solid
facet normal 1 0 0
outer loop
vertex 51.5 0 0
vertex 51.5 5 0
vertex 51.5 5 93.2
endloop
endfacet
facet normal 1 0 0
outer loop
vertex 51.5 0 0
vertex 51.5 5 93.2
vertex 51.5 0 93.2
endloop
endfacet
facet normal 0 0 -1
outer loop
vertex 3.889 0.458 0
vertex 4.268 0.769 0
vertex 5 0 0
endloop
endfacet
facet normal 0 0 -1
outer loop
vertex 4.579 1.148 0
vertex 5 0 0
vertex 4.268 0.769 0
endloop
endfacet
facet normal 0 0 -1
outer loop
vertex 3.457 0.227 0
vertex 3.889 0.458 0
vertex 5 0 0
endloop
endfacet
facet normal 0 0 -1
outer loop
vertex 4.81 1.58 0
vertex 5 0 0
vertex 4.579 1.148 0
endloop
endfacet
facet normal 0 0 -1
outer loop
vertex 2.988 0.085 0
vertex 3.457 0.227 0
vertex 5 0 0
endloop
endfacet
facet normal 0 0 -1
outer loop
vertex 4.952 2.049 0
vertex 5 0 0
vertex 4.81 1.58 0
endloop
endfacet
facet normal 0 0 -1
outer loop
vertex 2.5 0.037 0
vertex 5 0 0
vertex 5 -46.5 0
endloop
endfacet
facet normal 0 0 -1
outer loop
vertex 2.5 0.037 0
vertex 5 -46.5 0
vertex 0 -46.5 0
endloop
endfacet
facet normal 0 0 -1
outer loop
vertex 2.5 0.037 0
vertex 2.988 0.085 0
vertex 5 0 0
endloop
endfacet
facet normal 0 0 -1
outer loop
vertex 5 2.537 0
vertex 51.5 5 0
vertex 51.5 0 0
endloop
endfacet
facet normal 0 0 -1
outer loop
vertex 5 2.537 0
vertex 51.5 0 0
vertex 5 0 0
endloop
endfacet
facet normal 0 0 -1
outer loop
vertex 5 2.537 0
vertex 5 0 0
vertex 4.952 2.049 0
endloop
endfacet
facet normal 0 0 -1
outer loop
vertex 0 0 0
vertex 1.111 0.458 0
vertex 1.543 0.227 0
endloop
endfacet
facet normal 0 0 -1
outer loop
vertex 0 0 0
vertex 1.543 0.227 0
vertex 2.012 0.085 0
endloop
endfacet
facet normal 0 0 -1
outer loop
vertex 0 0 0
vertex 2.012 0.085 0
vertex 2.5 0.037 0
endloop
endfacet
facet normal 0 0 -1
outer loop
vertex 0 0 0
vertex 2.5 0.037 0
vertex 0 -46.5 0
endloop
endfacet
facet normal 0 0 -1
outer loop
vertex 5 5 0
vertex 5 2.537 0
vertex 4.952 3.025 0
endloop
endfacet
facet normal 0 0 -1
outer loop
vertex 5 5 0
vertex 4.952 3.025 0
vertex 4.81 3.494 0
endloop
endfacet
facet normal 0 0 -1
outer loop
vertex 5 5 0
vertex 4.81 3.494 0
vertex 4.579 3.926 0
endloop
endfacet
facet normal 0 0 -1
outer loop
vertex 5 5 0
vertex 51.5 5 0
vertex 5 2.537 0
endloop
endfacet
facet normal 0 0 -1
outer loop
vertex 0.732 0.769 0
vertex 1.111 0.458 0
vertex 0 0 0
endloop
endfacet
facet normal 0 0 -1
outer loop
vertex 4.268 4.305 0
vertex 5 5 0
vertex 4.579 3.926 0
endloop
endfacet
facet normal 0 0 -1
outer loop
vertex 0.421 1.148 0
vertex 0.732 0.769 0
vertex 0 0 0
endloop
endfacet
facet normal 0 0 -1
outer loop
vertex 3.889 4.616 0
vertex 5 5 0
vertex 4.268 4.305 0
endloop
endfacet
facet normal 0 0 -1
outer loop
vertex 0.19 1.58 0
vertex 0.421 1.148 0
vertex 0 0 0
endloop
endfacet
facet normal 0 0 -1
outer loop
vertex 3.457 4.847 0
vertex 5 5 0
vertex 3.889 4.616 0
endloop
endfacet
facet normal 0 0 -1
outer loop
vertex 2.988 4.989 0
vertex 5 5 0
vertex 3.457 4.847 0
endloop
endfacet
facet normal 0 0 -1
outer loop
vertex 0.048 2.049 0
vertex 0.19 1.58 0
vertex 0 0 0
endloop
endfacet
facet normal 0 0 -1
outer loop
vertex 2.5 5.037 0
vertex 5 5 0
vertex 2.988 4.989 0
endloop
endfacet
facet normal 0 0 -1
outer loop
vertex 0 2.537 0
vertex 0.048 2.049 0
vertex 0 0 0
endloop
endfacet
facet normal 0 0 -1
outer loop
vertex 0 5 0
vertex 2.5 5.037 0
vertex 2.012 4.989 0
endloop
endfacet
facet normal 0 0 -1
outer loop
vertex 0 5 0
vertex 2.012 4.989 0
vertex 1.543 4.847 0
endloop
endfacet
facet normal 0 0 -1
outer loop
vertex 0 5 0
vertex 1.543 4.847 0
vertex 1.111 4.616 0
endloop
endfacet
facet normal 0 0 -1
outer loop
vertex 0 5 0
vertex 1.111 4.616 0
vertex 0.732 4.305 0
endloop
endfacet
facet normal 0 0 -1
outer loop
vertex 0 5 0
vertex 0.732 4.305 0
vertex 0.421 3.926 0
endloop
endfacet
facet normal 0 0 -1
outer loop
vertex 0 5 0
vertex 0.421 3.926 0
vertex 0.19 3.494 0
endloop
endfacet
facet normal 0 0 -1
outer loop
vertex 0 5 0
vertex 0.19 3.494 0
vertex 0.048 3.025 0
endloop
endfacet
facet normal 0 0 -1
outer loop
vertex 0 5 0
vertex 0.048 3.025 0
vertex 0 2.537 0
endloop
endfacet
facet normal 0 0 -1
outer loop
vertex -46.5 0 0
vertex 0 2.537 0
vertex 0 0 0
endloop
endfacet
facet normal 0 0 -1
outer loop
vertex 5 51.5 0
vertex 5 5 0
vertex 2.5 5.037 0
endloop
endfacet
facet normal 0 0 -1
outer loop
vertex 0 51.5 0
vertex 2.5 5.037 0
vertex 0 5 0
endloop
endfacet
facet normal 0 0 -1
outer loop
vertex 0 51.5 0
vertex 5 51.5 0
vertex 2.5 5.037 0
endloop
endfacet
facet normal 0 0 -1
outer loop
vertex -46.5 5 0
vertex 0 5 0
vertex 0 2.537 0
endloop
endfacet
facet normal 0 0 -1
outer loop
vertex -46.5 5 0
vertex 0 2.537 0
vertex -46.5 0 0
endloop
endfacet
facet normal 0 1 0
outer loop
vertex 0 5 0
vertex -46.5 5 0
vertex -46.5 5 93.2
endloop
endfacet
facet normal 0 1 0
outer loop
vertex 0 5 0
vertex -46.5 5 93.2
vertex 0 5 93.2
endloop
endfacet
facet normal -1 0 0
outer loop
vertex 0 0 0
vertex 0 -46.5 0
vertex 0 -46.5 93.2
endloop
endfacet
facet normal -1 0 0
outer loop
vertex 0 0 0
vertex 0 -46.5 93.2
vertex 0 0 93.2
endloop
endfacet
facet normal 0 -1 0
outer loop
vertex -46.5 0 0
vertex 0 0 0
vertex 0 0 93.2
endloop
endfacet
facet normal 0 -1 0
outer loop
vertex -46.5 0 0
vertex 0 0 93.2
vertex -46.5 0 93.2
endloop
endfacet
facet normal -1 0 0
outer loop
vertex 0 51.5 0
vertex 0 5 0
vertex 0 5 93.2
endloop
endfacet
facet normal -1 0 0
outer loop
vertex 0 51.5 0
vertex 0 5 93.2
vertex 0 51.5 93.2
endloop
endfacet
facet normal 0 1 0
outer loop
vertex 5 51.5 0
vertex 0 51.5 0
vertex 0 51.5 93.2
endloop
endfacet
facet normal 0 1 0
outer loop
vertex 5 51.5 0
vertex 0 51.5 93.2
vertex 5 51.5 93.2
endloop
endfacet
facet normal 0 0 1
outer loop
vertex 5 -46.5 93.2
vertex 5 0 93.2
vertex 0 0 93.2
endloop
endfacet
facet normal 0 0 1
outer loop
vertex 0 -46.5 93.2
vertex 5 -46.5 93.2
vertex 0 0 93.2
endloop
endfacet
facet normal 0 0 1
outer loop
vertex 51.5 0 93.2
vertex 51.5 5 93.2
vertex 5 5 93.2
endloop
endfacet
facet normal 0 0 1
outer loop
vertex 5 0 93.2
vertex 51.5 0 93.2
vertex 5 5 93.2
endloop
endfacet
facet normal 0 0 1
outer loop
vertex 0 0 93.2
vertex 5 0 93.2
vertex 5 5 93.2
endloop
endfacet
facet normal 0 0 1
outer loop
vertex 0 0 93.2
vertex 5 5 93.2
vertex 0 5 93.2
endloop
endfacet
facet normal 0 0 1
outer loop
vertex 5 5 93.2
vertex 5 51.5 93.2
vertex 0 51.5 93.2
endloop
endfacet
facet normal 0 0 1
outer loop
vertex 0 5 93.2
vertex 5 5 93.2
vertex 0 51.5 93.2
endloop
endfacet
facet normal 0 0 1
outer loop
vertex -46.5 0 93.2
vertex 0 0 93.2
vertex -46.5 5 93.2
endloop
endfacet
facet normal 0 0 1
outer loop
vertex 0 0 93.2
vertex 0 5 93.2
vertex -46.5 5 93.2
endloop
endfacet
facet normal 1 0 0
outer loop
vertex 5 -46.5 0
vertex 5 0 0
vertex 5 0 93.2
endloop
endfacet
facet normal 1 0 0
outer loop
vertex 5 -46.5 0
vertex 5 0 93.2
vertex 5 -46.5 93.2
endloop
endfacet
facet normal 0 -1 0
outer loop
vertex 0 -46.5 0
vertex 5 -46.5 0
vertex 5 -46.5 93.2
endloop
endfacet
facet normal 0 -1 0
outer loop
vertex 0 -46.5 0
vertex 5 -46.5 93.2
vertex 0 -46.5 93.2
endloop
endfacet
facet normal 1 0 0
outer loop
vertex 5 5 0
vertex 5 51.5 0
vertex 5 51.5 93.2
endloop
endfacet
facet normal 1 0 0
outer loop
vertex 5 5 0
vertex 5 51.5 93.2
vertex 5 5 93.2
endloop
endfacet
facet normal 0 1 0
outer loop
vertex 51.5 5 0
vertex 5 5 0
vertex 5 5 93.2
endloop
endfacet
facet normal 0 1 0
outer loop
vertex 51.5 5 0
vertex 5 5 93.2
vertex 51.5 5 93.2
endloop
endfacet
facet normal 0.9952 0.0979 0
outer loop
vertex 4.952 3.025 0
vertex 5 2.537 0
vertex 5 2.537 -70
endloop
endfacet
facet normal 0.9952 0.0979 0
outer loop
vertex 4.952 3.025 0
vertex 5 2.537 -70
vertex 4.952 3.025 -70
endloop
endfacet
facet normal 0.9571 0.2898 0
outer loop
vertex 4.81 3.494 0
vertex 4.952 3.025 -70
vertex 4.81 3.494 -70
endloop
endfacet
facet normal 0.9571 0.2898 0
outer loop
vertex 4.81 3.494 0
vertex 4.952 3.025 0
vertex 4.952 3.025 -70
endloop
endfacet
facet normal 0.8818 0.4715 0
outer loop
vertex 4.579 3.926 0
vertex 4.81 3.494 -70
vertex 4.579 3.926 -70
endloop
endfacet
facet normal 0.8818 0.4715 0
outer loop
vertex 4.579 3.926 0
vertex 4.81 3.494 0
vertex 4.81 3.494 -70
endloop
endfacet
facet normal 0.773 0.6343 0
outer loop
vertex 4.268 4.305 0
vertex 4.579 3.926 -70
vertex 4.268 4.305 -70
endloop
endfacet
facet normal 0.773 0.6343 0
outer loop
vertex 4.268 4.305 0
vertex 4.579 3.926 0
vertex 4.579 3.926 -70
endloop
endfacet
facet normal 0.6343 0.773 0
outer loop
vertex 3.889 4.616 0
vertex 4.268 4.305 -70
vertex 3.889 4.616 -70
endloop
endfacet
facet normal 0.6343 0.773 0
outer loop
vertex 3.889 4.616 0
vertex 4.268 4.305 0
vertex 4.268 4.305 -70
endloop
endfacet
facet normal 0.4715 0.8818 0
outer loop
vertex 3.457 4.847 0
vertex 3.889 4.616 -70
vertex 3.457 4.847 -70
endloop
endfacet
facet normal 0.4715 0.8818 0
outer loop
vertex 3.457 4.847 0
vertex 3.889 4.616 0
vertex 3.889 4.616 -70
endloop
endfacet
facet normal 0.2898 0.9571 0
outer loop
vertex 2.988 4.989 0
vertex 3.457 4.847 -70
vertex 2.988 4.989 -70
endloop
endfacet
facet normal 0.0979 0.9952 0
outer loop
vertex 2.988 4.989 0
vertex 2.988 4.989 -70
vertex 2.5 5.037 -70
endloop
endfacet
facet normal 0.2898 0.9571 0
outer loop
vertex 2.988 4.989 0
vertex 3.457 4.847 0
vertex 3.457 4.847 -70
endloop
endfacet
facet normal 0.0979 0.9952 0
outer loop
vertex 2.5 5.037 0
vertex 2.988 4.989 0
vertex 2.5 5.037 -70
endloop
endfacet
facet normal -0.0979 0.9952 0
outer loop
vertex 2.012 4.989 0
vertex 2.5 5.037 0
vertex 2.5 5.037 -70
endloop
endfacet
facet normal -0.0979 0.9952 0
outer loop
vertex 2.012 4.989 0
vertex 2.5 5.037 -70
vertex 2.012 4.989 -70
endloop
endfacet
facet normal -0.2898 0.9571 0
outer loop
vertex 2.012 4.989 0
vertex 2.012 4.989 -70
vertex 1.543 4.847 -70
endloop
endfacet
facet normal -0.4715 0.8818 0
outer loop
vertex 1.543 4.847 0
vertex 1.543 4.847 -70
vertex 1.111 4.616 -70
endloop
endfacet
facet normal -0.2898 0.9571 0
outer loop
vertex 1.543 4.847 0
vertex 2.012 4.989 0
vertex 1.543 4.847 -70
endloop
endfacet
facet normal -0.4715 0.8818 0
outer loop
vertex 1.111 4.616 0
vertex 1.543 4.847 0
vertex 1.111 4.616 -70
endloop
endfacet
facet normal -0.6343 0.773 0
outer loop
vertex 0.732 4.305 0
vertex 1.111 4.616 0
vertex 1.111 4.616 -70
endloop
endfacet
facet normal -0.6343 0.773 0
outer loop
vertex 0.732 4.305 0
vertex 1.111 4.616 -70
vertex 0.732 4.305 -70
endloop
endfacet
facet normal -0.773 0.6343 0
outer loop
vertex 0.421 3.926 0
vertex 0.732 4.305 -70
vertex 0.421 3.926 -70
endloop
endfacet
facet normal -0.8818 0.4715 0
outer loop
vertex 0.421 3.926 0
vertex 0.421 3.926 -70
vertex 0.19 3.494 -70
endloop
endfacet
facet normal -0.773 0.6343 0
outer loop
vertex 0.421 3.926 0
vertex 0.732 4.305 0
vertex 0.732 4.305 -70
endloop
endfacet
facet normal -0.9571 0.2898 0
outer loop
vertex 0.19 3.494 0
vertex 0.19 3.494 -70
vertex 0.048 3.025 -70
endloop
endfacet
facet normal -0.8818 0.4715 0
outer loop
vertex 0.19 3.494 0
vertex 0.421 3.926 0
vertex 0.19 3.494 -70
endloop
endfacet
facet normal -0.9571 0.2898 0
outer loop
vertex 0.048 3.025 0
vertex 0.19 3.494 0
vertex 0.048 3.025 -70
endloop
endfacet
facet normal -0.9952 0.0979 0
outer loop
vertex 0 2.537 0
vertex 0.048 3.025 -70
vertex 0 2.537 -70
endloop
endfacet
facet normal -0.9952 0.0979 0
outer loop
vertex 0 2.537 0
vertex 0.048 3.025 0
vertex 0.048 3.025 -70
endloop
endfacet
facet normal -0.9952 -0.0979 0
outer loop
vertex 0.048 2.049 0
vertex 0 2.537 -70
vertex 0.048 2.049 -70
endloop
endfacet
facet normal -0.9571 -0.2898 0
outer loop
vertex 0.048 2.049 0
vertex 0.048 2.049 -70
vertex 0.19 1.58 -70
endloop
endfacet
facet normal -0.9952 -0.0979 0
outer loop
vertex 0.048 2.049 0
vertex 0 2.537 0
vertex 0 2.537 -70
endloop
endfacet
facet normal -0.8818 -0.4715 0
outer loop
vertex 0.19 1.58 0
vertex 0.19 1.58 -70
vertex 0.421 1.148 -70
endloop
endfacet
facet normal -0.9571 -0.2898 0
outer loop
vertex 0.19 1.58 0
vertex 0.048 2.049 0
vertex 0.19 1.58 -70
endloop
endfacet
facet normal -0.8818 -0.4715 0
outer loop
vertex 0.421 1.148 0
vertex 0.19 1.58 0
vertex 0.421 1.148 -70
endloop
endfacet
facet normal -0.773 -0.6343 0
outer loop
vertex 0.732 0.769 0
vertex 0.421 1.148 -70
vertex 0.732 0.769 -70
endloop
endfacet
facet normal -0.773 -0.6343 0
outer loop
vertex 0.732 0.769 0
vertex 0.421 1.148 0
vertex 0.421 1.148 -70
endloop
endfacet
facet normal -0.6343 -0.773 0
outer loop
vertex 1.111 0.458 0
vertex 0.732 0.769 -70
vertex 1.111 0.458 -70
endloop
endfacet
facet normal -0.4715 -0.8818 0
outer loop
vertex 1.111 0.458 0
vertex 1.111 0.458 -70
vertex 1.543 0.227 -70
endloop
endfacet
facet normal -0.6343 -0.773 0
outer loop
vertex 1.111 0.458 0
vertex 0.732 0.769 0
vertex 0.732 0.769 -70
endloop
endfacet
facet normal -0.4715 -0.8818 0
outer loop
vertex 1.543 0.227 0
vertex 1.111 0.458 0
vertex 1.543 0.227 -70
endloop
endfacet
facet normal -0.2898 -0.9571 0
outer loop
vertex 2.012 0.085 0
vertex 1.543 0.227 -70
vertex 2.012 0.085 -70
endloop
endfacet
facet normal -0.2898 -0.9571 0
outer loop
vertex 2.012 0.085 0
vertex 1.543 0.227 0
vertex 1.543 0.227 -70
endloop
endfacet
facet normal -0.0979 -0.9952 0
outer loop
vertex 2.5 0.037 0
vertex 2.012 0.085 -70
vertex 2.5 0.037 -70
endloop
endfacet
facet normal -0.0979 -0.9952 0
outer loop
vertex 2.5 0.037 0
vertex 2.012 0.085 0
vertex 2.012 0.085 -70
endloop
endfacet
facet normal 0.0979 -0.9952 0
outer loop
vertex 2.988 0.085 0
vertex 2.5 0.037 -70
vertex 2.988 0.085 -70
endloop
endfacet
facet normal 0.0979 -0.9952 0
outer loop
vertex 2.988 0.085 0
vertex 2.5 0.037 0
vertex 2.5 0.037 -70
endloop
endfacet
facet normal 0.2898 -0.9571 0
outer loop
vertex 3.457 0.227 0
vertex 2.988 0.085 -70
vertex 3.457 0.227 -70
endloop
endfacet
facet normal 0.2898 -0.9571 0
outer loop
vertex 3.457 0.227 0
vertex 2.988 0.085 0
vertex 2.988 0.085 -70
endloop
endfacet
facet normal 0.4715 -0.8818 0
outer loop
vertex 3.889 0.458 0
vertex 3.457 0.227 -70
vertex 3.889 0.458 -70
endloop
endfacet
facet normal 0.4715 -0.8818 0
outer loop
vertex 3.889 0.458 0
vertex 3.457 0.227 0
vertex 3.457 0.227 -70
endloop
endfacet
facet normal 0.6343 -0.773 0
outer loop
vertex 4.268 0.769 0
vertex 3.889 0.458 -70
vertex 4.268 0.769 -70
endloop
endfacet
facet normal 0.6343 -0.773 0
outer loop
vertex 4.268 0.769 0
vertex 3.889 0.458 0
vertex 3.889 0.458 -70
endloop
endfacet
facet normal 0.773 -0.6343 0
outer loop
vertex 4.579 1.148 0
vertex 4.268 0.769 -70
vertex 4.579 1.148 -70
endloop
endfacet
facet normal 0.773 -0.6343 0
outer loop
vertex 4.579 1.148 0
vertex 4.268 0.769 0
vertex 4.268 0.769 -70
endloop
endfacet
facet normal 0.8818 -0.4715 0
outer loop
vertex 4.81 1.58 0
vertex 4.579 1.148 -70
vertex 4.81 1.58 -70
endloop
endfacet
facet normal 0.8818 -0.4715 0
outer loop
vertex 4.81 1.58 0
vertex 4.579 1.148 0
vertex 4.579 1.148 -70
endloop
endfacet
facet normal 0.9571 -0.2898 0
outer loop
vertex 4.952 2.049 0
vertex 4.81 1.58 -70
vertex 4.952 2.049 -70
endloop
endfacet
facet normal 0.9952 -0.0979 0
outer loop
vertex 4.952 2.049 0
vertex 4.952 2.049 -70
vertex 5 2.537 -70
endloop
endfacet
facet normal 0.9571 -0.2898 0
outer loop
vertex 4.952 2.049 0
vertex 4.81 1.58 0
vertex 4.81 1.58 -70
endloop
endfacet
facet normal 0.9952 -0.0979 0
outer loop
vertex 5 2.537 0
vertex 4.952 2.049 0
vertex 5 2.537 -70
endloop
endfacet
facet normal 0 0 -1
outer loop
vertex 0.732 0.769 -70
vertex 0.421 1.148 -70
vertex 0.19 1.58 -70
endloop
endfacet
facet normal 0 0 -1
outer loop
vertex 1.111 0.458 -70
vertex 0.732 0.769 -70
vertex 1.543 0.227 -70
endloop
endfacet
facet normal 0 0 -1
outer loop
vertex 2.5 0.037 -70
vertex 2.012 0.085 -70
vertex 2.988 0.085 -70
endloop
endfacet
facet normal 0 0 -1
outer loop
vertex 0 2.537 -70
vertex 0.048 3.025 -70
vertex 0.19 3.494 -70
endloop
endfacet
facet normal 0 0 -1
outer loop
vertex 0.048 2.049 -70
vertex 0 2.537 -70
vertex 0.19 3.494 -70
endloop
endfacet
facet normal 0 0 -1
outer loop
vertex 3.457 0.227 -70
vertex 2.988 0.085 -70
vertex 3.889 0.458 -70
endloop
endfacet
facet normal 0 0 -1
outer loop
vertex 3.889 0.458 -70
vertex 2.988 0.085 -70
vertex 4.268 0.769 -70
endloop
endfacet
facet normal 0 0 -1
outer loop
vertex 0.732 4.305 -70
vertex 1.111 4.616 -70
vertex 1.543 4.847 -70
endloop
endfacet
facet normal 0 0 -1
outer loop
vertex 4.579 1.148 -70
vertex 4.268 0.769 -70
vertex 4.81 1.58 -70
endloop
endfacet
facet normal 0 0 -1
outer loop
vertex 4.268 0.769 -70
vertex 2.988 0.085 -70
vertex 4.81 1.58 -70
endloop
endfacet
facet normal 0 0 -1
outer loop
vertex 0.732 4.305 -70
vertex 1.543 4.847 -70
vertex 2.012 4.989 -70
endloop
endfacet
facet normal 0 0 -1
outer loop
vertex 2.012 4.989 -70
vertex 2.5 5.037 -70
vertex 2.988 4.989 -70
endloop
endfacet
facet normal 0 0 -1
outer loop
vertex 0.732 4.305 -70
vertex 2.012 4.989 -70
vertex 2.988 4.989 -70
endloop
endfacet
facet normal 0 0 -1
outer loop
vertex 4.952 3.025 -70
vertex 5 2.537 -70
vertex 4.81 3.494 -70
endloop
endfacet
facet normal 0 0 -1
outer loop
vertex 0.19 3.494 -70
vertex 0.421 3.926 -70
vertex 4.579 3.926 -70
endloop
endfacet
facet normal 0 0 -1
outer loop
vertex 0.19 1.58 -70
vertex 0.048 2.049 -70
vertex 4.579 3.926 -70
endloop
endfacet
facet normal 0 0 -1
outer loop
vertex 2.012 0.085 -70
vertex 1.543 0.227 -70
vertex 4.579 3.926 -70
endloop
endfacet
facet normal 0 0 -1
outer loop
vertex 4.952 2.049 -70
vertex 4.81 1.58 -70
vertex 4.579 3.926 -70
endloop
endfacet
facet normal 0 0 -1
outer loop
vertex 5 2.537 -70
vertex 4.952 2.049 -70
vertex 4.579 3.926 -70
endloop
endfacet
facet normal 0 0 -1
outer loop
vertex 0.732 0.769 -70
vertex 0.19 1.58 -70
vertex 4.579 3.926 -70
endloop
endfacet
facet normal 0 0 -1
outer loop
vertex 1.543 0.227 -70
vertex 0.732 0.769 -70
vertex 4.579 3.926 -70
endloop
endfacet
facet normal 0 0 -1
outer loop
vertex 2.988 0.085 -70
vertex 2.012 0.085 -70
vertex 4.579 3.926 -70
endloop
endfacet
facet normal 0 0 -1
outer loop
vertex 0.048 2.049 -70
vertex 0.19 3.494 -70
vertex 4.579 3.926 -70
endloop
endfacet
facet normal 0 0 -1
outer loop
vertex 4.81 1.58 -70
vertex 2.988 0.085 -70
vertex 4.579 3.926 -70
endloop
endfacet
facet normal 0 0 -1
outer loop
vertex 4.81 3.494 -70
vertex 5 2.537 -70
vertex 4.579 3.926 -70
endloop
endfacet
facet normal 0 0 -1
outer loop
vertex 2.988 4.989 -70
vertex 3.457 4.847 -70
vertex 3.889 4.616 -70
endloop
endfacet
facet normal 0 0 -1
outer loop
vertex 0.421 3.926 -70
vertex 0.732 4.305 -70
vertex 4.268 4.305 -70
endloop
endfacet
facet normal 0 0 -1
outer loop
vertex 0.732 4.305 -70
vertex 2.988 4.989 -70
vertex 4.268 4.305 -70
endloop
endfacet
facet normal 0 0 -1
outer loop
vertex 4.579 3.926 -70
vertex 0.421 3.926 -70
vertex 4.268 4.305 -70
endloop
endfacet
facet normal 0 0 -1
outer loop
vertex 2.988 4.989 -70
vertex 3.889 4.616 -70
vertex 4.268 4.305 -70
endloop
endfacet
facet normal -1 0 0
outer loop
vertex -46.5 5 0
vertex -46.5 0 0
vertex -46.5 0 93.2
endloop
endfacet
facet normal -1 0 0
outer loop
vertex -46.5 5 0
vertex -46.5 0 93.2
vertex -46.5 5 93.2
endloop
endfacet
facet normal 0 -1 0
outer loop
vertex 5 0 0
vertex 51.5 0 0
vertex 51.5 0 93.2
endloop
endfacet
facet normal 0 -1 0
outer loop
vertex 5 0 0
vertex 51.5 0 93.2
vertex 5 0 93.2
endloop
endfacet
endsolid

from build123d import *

# Parameters (mm, degrees)
P_IDAT_VYSUNUT_M1_DEPTH = 93.2
SKICA2_R                = 2.5
P_IDAT_VYSUNUT_M2_DEPTH = 70


with BuildPart() as part:
    # Skica1 → Přidat vysunutím1 (new body)
    with BuildSketch(Plane.XY):
        Polygon((0, 0), (-46.5, 0), (-46.5, 5), (0, 5), (0, 51.5), (5, 51.5), (5, 5), (51.5, 5), (51.5, 0), (5, 0), (5, -46.5), (0, -46.5), align=None)
    extrude(amount=P_IDAT_VYSUNUT_M1_DEPTH)

    # Skica2 → Přidat vysunutím2 (add)
    with BuildSketch(Plane.XY):
        with Locations((2.5, 2.536963061)):
            Circle(SKICA2_R)
    extrude(amount=-P_IDAT_VYSUNUT_M2_DEPTH)


solid = part.part
